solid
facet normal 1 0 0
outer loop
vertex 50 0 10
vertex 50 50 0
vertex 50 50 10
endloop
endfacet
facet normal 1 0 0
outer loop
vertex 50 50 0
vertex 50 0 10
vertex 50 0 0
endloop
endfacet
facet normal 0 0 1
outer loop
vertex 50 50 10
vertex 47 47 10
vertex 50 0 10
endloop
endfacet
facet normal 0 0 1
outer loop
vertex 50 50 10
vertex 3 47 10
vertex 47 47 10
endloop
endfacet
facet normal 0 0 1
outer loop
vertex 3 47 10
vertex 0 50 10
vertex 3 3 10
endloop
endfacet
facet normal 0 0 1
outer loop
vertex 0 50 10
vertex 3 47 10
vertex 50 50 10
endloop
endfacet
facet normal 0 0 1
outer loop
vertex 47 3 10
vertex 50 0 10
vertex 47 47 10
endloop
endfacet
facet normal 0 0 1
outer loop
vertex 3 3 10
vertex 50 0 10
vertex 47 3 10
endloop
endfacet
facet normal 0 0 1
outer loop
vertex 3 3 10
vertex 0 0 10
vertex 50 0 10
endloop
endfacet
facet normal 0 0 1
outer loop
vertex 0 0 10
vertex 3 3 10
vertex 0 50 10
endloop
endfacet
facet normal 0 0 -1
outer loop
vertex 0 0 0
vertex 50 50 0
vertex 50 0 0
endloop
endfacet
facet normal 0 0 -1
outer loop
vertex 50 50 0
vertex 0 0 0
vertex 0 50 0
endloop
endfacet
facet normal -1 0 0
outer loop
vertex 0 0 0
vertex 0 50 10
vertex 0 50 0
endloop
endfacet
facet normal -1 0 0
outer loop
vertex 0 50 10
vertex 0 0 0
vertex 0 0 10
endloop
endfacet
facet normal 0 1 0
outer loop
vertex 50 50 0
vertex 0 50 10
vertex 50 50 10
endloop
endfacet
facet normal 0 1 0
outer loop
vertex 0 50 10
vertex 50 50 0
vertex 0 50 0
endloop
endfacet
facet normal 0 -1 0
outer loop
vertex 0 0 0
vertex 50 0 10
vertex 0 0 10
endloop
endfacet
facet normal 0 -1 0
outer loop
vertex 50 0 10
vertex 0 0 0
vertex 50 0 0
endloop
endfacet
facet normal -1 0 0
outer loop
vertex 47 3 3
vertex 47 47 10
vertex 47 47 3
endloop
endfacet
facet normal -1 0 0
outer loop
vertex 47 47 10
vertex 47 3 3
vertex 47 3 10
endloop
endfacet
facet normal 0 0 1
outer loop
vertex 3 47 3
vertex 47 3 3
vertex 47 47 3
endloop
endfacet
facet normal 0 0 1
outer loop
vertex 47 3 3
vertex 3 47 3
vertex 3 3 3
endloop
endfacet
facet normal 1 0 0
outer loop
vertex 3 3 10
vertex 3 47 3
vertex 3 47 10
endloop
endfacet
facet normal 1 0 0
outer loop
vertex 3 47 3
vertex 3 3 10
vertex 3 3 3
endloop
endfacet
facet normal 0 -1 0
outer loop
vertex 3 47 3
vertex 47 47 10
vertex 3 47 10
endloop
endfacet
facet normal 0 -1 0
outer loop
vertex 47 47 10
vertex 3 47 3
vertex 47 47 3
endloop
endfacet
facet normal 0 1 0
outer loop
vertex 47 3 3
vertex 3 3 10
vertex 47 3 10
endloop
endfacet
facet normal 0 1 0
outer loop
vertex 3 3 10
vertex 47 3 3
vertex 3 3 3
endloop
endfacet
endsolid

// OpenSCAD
// Generated by HEIDI for job job_1787770634522_9efca6e8
// Product: 3D-Printable Model Preparation Package
// Request: Failure injection test
// Model type: box
// Generated: 2026-09-07T04:35:15.434Z
//
// This is a parameterized OpenSCAD model. You can adjust the
// parameters below to customize the dimensions before rendering.

// ─── Parameters ───
width = 50;       // X dimension in mm
height = 50;     // Y dimension in mm
depth = 10;       // Z dimension in mm
wall = 3;    // wall thickness in mm
$fn = 60;               // facet resolution

// Parametric hollow box
module parametric_box() {
    difference() {
        // Outer shell
        cube([width, height, depth]);
        // Inner cavity
        translate([wall, wall, wall])
            cube([width - wall * 2, height - wall * 2, depth - wall + 1]);
    }
}
parametric_box();
